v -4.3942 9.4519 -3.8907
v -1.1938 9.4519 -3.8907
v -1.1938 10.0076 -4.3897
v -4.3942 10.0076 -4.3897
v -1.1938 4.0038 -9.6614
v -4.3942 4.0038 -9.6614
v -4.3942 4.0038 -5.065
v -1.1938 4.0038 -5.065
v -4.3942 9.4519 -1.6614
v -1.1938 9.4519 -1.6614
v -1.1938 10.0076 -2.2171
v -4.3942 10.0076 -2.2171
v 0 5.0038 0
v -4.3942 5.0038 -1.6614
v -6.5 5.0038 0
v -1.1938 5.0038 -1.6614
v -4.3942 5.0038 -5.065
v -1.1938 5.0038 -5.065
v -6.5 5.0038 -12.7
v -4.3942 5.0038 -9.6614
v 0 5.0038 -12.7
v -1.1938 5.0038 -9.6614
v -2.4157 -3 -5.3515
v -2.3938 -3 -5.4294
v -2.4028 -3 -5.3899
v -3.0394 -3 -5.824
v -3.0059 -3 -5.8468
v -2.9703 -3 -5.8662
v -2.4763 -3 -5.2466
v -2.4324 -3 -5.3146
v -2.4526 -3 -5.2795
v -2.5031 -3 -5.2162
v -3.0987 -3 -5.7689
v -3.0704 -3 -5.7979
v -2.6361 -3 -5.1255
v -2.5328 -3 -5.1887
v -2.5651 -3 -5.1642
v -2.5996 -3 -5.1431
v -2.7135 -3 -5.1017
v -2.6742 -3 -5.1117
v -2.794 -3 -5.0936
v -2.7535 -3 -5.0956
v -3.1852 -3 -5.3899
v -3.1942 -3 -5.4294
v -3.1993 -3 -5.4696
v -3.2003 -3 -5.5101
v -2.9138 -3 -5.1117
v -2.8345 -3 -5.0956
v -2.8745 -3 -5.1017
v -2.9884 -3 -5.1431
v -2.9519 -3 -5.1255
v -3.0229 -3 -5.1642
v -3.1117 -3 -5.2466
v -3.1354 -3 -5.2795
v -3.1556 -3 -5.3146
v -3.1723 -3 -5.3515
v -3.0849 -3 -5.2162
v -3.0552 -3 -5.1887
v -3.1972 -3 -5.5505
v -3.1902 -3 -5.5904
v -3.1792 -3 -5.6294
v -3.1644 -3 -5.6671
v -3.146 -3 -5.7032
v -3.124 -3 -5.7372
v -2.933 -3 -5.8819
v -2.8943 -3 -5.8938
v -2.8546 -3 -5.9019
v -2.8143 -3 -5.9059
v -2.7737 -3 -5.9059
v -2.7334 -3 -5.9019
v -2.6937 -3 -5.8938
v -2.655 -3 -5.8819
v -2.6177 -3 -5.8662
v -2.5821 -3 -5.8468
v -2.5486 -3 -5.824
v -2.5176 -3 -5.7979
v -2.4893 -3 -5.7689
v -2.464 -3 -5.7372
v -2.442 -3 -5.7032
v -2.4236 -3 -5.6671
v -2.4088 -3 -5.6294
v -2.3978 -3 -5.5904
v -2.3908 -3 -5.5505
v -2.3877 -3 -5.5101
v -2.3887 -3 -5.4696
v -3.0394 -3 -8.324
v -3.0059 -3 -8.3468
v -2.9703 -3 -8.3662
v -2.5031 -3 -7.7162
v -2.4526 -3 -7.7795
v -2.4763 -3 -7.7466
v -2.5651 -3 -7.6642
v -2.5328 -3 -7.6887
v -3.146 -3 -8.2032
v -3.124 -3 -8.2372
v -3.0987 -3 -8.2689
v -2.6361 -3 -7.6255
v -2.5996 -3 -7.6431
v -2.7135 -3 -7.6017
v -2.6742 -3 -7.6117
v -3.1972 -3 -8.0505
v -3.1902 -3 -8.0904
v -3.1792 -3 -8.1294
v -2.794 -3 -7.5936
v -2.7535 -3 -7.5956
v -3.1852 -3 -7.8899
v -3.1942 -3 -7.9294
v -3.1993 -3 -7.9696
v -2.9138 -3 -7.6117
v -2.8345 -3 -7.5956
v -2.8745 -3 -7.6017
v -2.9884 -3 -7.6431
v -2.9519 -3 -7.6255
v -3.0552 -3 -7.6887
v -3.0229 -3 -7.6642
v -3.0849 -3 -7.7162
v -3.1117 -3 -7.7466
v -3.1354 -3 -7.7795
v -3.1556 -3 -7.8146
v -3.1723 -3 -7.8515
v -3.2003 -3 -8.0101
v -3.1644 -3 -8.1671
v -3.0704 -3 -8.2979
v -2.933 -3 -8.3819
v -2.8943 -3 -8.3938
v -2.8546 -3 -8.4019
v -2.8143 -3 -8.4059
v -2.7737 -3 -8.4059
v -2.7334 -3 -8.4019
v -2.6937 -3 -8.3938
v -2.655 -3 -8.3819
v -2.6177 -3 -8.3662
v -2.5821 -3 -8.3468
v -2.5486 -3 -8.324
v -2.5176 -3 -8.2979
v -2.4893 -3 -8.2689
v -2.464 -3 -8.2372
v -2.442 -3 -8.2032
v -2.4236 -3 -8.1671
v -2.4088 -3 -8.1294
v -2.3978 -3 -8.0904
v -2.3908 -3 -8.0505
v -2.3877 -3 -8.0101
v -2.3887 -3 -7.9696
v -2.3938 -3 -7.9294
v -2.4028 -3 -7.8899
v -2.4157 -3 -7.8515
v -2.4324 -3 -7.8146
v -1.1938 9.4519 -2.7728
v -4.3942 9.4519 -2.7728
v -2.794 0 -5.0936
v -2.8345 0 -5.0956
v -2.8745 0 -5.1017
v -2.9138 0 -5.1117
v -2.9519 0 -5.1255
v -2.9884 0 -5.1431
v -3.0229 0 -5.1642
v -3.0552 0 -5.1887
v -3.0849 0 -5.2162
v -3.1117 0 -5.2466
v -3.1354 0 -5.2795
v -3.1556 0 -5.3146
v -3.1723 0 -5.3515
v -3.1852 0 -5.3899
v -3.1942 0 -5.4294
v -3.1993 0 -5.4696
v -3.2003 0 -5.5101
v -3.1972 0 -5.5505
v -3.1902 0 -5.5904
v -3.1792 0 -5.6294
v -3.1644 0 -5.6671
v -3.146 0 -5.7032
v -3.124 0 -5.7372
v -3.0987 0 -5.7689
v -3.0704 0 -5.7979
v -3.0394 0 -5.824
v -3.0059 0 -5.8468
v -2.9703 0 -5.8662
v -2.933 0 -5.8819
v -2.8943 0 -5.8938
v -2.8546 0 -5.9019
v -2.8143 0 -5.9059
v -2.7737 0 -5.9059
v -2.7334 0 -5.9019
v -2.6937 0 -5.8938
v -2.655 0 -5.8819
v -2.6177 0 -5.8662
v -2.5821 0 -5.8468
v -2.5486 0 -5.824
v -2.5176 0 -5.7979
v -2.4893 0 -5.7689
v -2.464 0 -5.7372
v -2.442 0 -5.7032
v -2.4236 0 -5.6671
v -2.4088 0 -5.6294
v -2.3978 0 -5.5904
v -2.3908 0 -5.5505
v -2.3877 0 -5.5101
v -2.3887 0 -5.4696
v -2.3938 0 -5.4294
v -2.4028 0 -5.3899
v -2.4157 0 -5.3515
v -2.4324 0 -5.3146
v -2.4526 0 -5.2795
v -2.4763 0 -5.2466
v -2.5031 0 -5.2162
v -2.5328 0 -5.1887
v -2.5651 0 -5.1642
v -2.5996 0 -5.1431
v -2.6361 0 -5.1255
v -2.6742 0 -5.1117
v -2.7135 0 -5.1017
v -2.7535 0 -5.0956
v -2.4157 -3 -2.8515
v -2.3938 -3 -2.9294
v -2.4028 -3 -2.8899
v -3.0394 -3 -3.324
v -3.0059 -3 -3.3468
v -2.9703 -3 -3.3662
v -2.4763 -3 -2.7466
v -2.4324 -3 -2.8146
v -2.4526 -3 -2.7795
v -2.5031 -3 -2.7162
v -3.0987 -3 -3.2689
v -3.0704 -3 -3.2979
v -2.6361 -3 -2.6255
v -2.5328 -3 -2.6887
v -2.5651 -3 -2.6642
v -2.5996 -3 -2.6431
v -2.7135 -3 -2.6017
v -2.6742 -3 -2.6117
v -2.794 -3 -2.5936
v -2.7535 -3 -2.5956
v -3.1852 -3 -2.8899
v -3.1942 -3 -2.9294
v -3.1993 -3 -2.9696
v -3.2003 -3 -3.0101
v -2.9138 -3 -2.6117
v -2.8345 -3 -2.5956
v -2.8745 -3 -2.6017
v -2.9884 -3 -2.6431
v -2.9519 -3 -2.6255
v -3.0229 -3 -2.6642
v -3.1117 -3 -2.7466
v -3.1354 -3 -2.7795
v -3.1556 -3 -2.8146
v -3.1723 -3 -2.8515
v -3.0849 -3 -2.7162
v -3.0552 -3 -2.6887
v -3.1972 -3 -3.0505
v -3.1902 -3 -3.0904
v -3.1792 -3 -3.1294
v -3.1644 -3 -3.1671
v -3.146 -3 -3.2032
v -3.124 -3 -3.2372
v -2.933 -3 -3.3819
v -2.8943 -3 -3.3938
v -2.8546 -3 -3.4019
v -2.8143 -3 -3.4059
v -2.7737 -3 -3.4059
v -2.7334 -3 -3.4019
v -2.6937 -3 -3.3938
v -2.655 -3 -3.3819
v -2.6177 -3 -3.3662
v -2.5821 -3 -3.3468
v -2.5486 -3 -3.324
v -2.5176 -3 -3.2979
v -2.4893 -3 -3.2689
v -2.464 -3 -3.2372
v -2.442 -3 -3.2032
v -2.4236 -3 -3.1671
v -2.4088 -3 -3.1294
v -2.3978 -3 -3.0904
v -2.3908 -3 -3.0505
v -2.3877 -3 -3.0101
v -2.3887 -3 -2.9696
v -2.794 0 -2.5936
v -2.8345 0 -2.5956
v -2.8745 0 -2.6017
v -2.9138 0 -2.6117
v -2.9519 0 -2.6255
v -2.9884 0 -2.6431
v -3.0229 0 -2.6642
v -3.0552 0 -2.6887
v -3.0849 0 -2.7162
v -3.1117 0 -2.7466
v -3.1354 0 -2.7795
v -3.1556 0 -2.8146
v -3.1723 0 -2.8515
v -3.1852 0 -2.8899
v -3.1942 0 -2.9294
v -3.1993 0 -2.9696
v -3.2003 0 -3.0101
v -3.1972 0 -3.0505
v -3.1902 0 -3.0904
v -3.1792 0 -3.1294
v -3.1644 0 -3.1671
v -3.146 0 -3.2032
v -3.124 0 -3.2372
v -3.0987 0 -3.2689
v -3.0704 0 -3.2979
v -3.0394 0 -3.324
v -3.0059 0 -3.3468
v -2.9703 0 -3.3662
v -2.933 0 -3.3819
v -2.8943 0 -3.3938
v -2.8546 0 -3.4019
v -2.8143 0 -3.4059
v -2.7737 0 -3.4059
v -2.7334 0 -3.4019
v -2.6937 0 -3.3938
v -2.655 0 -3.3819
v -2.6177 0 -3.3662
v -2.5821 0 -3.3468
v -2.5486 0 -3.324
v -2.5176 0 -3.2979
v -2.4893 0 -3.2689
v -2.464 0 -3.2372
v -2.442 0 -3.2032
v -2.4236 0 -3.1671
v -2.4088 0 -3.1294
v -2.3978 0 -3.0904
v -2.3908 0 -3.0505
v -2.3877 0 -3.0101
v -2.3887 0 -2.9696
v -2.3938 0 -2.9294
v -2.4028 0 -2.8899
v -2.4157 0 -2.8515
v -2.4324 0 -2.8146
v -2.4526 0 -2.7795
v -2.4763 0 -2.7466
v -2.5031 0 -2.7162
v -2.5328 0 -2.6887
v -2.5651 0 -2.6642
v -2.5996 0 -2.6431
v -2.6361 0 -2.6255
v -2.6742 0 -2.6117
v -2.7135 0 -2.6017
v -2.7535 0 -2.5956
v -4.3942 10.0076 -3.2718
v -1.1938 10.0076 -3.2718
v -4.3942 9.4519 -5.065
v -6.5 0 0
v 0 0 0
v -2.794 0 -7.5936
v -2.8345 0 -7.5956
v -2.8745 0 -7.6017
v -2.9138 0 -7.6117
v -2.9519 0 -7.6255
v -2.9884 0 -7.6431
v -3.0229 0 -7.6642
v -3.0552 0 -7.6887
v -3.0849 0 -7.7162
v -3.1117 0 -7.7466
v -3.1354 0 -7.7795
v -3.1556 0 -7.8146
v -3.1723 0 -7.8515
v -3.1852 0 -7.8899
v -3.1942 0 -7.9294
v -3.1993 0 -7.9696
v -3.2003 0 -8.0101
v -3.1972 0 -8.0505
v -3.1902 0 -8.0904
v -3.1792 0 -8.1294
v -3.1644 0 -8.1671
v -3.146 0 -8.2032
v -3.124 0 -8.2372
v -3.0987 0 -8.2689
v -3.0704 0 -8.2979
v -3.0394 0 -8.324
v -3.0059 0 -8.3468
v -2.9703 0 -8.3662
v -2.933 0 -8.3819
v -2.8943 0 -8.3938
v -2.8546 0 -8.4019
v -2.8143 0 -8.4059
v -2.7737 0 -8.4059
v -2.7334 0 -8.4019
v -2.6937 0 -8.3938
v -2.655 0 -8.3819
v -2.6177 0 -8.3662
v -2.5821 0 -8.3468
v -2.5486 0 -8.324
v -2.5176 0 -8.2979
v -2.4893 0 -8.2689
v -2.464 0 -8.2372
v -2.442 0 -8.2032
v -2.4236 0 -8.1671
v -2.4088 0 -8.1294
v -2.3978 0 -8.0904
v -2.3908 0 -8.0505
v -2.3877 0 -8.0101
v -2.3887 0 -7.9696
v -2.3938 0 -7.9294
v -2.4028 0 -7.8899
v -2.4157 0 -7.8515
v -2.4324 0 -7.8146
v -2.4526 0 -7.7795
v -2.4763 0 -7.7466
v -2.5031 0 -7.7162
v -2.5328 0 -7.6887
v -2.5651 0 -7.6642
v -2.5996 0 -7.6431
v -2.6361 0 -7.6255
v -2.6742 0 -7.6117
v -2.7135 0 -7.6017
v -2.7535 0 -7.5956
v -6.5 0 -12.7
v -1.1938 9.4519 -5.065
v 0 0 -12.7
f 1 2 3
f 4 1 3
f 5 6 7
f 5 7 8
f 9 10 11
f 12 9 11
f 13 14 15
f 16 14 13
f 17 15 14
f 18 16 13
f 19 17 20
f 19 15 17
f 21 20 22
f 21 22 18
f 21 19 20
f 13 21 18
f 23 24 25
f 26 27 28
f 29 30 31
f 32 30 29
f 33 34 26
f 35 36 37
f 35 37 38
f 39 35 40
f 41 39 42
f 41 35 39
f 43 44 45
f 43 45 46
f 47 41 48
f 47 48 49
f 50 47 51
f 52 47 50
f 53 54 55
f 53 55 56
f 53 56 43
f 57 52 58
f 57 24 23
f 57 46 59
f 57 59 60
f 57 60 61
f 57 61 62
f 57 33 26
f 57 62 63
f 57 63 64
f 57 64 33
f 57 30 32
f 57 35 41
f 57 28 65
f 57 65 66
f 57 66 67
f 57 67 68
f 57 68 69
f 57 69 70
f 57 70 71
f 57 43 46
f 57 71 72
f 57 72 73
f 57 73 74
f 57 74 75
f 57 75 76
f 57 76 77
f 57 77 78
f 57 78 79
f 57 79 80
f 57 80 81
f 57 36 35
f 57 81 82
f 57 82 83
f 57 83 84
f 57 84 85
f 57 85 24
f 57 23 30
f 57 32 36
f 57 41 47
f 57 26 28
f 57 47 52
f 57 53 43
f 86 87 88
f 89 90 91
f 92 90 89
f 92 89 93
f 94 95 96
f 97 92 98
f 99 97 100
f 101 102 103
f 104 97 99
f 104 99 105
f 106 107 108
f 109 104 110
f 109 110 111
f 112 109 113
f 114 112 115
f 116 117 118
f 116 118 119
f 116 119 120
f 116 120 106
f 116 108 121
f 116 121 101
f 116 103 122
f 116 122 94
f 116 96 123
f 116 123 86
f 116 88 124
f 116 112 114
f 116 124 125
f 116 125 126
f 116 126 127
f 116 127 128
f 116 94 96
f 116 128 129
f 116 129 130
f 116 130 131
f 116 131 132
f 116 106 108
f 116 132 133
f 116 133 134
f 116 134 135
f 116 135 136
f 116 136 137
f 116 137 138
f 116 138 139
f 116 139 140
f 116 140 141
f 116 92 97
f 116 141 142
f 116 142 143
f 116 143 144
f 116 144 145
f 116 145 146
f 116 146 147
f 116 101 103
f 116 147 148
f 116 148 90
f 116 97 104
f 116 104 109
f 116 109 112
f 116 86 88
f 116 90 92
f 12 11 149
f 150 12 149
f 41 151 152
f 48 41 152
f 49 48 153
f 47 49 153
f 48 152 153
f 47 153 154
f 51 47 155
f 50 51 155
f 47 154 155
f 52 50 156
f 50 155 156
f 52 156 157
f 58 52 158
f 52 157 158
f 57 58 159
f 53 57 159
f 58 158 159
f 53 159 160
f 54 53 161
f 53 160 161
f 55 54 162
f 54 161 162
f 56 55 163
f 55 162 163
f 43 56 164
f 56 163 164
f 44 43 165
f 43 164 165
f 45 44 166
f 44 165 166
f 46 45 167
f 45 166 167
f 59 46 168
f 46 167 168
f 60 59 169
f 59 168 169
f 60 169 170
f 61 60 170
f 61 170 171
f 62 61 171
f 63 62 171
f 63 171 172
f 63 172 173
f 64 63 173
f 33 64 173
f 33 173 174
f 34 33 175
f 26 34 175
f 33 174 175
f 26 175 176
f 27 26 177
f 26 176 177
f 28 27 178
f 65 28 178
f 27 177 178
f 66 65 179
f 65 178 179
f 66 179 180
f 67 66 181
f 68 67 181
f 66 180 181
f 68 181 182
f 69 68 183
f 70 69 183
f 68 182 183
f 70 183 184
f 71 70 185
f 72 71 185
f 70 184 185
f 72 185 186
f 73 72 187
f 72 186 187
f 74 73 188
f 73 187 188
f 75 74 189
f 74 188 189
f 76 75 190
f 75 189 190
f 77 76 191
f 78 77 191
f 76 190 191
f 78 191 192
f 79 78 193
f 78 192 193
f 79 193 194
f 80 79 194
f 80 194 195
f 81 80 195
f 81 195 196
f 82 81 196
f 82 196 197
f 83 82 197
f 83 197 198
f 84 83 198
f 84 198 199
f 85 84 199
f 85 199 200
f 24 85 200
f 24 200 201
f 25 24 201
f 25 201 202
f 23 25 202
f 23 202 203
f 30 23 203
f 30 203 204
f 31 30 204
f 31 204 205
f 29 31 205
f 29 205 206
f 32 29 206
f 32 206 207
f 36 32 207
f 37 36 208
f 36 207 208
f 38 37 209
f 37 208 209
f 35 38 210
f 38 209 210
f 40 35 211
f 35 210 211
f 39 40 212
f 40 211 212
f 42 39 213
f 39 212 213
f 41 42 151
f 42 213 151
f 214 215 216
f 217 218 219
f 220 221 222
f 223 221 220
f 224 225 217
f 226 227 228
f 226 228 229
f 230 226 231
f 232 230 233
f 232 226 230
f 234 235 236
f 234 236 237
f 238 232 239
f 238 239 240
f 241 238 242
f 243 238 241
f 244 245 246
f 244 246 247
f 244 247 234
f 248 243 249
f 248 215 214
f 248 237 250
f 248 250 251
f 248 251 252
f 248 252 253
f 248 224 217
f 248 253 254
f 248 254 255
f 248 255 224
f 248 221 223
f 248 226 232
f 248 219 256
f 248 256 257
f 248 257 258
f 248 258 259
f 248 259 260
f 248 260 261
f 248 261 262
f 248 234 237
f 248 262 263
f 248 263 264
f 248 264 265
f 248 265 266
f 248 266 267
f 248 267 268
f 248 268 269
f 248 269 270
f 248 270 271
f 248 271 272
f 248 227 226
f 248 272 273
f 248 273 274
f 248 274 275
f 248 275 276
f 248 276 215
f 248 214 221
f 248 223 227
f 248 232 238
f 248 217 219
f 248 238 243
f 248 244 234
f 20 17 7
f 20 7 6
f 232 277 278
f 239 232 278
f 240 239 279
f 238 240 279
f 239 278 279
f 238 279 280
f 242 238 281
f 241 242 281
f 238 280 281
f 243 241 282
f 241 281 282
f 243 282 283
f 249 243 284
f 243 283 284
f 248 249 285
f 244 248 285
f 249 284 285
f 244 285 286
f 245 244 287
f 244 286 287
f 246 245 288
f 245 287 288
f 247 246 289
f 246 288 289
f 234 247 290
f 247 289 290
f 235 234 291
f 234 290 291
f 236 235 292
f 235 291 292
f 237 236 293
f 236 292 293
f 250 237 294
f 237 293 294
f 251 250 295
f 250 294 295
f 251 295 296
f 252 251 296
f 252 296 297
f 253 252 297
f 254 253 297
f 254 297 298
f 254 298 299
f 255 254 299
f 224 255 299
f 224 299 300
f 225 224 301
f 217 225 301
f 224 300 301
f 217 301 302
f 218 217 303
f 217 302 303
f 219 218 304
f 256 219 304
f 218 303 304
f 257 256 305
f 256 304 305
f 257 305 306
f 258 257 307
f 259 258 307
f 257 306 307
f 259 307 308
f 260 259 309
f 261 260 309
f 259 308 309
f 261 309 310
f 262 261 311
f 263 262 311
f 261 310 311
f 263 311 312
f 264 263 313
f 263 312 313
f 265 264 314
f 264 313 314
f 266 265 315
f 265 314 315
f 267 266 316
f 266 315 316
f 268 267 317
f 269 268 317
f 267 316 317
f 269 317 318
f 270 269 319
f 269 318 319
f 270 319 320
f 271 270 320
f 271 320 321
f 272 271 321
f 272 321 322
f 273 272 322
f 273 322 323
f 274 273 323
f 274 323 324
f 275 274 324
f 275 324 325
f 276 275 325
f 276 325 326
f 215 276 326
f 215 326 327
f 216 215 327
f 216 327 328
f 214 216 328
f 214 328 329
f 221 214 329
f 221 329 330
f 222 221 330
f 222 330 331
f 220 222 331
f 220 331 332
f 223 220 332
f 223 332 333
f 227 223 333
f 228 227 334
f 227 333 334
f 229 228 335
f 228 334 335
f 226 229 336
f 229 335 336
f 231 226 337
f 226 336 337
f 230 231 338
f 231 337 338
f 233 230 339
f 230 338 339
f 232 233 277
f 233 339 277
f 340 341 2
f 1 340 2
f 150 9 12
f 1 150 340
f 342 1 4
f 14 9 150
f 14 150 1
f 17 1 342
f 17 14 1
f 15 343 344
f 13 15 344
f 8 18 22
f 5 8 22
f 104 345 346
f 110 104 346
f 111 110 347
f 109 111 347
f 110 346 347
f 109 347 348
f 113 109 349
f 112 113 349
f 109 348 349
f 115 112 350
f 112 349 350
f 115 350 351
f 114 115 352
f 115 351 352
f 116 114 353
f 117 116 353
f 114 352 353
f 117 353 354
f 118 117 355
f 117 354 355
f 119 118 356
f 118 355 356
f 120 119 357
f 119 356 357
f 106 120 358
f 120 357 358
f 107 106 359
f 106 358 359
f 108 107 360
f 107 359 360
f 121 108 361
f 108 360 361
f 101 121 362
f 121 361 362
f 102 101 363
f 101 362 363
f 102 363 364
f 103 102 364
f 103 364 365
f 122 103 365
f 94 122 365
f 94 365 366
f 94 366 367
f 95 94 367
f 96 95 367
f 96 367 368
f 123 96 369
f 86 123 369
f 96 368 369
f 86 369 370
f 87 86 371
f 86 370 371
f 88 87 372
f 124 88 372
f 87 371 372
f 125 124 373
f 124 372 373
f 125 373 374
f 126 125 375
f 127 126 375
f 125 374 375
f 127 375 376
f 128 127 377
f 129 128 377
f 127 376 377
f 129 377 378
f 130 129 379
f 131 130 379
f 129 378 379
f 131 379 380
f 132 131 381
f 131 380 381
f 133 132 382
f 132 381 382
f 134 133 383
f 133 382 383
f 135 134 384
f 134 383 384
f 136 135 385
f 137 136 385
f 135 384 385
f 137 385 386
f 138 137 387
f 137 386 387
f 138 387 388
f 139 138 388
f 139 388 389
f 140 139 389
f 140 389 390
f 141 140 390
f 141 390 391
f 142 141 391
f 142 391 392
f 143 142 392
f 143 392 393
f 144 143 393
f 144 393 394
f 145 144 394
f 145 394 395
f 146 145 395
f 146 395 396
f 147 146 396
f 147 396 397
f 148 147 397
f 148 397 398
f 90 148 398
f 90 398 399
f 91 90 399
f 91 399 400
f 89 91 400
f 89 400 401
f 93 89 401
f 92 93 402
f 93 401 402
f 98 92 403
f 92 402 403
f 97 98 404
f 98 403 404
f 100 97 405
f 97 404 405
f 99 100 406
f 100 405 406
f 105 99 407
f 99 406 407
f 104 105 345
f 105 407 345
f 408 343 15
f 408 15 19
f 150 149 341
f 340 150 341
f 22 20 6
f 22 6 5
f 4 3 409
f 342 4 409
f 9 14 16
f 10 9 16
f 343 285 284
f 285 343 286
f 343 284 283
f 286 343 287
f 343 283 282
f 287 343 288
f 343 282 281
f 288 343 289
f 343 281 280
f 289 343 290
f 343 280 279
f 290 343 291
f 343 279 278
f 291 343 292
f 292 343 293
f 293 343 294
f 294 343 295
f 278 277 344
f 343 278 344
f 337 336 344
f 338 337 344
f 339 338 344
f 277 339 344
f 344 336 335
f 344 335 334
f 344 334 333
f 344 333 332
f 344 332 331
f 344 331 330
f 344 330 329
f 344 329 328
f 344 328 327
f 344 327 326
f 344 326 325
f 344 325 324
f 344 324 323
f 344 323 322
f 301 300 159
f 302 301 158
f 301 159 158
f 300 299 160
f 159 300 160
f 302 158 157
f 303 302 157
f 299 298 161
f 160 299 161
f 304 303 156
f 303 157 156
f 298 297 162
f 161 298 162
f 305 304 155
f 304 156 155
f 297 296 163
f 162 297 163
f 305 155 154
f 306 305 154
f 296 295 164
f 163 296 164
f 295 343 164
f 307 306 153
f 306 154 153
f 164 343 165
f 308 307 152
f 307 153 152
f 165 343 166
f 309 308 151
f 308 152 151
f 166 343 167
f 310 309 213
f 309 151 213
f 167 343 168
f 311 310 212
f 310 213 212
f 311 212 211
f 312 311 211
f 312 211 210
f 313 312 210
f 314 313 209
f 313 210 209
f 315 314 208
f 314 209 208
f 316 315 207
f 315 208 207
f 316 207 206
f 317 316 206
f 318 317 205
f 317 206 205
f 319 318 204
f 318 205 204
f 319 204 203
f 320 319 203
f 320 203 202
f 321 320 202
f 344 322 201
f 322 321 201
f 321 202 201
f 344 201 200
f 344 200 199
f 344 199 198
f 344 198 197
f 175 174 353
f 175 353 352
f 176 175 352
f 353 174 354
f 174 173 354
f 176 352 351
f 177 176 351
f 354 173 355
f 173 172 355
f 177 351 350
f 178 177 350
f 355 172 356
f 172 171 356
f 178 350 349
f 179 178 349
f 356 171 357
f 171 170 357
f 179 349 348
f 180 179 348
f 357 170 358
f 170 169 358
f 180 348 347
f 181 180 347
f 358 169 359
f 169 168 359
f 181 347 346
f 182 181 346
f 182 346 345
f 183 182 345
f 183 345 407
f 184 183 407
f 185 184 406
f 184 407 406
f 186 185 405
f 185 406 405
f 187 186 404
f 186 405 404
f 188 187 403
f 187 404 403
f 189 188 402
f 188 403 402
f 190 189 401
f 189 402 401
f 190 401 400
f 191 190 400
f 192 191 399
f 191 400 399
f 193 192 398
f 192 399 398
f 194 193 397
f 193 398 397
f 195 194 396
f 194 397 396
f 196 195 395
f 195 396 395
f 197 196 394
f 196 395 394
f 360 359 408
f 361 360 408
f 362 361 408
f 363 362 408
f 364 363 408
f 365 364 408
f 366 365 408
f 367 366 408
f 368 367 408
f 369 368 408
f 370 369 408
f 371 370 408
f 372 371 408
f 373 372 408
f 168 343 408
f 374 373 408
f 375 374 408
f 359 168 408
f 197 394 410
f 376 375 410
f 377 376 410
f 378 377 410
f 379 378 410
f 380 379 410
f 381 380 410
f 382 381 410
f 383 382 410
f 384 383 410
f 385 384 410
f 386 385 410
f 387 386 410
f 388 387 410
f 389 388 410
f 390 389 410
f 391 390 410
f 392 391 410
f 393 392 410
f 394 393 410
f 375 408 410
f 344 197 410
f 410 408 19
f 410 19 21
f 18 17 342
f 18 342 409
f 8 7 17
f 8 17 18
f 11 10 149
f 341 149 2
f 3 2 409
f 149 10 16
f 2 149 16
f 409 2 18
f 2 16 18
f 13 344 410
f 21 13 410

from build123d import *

# Parameters (mm, degrees)
SKETCH1_W           = 6.5
SKETCH1_H           = 12.7
BOSS_EXTRUDE1_DEPTH = 5.0038
SKETCH2_W           = 3.2004
SKETCH2_H           = 3.4036
BOSS_EXTRUDE2_DEPTH = 5.0038
SKETCH3_W           = 3.2004
SKETCH3_H           = 4.5964
CUT_EXTRUDE1_DEPTH  = 1
CUT_EXTRUDE2_DEPTH  = 11
SKETCH5_R           = 0.4064
BOSS_EXTRUDE3_DEPTH = 3


with BuildPart() as part:
    # Sketch1 → Boss-Extrude1 (new body)
    with BuildSketch(Plane(origin=(0, 0, 0), x_dir=(1, 0, 0), z_dir=(0, 1, 0))):
        with Locations((-3.25, 6.35)):
            Rectangle(SKETCH1_W, SKETCH1_H)
    extrude(amount=BOSS_EXTRUDE1_DEPTH)

    # Sketch2 → Boss-Extrude2 (add)
    with BuildSketch(Plane(origin=(0, 5.0038, 0), x_dir=(1, 0, 0), z_dir=(0, 1, 0))):
        with Locations((-2.794, 3.363221349)):
            Rectangle(SKETCH2_W, SKETCH2_H)
    extrude(amount=BOSS_EXTRUDE2_DEPTH)

    # Sketch3 → Cut-Extrude1 (cut)
    with BuildSketch(Plane(origin=(0, 5.0038, 0), x_dir=(1, 0, 0), z_dir=(0, 1, 0))):
        with Locations((-2.794, 7.363221349)):
            Rectangle(SKETCH3_W, SKETCH3_H)
    extrude(amount=-CUT_EXTRUDE1_DEPTH, mode=Mode.SUBTRACT)

    # Sketch4 → Cut-Extrude2 (cut)
    with BuildSketch(Plane(origin=(-1.1938, 0, 0), x_dir=(0, 0, -1), z_dir=(1, 0, 0))):
        Polygon((1.661421349, 10.0076), (1.661421349, 9.45189334), (2.217128008, 10.0076), align=None)
        Polygon((3.271843346, 10.0076), (2.217128008, 10.0076), (2.772834668, 9.45189334), align=None)
        Polygon((4.38969876, 10.0076), (3.271843346, 10.0076), (3.890690082, 9.45189334), align=None)
        Polygon((5.065021349, 10.0076), (4.38969876, 10.0076), (5.065021349, 9.45189334), align=None)
    extrude(amount=-CUT_EXTRUDE2_DEPTH, mode=Mode.SUBTRACT)

    # Sketch5 → Boss-Extrude3 (add)
    with BuildSketch(Plane(origin=(0, 0, 0), x_dir=(-1, 0, 0), z_dir=(0, -1, 0))):
        with Locations(Location((2.794, 3, 0), (0, 0, 270))):
            Circle(SKETCH5_R)
        with Locations(Location((2.794, 5.5, 0), (0, 0, 270))):
            Circle(SKETCH5_R)
        with Locations(Location((2.794, 8, 0), (0, 0, 270))):
            Circle(SKETCH5_R)
    extrude(amount=BOSS_EXTRUDE3_DEPTH)


solid = part.part
